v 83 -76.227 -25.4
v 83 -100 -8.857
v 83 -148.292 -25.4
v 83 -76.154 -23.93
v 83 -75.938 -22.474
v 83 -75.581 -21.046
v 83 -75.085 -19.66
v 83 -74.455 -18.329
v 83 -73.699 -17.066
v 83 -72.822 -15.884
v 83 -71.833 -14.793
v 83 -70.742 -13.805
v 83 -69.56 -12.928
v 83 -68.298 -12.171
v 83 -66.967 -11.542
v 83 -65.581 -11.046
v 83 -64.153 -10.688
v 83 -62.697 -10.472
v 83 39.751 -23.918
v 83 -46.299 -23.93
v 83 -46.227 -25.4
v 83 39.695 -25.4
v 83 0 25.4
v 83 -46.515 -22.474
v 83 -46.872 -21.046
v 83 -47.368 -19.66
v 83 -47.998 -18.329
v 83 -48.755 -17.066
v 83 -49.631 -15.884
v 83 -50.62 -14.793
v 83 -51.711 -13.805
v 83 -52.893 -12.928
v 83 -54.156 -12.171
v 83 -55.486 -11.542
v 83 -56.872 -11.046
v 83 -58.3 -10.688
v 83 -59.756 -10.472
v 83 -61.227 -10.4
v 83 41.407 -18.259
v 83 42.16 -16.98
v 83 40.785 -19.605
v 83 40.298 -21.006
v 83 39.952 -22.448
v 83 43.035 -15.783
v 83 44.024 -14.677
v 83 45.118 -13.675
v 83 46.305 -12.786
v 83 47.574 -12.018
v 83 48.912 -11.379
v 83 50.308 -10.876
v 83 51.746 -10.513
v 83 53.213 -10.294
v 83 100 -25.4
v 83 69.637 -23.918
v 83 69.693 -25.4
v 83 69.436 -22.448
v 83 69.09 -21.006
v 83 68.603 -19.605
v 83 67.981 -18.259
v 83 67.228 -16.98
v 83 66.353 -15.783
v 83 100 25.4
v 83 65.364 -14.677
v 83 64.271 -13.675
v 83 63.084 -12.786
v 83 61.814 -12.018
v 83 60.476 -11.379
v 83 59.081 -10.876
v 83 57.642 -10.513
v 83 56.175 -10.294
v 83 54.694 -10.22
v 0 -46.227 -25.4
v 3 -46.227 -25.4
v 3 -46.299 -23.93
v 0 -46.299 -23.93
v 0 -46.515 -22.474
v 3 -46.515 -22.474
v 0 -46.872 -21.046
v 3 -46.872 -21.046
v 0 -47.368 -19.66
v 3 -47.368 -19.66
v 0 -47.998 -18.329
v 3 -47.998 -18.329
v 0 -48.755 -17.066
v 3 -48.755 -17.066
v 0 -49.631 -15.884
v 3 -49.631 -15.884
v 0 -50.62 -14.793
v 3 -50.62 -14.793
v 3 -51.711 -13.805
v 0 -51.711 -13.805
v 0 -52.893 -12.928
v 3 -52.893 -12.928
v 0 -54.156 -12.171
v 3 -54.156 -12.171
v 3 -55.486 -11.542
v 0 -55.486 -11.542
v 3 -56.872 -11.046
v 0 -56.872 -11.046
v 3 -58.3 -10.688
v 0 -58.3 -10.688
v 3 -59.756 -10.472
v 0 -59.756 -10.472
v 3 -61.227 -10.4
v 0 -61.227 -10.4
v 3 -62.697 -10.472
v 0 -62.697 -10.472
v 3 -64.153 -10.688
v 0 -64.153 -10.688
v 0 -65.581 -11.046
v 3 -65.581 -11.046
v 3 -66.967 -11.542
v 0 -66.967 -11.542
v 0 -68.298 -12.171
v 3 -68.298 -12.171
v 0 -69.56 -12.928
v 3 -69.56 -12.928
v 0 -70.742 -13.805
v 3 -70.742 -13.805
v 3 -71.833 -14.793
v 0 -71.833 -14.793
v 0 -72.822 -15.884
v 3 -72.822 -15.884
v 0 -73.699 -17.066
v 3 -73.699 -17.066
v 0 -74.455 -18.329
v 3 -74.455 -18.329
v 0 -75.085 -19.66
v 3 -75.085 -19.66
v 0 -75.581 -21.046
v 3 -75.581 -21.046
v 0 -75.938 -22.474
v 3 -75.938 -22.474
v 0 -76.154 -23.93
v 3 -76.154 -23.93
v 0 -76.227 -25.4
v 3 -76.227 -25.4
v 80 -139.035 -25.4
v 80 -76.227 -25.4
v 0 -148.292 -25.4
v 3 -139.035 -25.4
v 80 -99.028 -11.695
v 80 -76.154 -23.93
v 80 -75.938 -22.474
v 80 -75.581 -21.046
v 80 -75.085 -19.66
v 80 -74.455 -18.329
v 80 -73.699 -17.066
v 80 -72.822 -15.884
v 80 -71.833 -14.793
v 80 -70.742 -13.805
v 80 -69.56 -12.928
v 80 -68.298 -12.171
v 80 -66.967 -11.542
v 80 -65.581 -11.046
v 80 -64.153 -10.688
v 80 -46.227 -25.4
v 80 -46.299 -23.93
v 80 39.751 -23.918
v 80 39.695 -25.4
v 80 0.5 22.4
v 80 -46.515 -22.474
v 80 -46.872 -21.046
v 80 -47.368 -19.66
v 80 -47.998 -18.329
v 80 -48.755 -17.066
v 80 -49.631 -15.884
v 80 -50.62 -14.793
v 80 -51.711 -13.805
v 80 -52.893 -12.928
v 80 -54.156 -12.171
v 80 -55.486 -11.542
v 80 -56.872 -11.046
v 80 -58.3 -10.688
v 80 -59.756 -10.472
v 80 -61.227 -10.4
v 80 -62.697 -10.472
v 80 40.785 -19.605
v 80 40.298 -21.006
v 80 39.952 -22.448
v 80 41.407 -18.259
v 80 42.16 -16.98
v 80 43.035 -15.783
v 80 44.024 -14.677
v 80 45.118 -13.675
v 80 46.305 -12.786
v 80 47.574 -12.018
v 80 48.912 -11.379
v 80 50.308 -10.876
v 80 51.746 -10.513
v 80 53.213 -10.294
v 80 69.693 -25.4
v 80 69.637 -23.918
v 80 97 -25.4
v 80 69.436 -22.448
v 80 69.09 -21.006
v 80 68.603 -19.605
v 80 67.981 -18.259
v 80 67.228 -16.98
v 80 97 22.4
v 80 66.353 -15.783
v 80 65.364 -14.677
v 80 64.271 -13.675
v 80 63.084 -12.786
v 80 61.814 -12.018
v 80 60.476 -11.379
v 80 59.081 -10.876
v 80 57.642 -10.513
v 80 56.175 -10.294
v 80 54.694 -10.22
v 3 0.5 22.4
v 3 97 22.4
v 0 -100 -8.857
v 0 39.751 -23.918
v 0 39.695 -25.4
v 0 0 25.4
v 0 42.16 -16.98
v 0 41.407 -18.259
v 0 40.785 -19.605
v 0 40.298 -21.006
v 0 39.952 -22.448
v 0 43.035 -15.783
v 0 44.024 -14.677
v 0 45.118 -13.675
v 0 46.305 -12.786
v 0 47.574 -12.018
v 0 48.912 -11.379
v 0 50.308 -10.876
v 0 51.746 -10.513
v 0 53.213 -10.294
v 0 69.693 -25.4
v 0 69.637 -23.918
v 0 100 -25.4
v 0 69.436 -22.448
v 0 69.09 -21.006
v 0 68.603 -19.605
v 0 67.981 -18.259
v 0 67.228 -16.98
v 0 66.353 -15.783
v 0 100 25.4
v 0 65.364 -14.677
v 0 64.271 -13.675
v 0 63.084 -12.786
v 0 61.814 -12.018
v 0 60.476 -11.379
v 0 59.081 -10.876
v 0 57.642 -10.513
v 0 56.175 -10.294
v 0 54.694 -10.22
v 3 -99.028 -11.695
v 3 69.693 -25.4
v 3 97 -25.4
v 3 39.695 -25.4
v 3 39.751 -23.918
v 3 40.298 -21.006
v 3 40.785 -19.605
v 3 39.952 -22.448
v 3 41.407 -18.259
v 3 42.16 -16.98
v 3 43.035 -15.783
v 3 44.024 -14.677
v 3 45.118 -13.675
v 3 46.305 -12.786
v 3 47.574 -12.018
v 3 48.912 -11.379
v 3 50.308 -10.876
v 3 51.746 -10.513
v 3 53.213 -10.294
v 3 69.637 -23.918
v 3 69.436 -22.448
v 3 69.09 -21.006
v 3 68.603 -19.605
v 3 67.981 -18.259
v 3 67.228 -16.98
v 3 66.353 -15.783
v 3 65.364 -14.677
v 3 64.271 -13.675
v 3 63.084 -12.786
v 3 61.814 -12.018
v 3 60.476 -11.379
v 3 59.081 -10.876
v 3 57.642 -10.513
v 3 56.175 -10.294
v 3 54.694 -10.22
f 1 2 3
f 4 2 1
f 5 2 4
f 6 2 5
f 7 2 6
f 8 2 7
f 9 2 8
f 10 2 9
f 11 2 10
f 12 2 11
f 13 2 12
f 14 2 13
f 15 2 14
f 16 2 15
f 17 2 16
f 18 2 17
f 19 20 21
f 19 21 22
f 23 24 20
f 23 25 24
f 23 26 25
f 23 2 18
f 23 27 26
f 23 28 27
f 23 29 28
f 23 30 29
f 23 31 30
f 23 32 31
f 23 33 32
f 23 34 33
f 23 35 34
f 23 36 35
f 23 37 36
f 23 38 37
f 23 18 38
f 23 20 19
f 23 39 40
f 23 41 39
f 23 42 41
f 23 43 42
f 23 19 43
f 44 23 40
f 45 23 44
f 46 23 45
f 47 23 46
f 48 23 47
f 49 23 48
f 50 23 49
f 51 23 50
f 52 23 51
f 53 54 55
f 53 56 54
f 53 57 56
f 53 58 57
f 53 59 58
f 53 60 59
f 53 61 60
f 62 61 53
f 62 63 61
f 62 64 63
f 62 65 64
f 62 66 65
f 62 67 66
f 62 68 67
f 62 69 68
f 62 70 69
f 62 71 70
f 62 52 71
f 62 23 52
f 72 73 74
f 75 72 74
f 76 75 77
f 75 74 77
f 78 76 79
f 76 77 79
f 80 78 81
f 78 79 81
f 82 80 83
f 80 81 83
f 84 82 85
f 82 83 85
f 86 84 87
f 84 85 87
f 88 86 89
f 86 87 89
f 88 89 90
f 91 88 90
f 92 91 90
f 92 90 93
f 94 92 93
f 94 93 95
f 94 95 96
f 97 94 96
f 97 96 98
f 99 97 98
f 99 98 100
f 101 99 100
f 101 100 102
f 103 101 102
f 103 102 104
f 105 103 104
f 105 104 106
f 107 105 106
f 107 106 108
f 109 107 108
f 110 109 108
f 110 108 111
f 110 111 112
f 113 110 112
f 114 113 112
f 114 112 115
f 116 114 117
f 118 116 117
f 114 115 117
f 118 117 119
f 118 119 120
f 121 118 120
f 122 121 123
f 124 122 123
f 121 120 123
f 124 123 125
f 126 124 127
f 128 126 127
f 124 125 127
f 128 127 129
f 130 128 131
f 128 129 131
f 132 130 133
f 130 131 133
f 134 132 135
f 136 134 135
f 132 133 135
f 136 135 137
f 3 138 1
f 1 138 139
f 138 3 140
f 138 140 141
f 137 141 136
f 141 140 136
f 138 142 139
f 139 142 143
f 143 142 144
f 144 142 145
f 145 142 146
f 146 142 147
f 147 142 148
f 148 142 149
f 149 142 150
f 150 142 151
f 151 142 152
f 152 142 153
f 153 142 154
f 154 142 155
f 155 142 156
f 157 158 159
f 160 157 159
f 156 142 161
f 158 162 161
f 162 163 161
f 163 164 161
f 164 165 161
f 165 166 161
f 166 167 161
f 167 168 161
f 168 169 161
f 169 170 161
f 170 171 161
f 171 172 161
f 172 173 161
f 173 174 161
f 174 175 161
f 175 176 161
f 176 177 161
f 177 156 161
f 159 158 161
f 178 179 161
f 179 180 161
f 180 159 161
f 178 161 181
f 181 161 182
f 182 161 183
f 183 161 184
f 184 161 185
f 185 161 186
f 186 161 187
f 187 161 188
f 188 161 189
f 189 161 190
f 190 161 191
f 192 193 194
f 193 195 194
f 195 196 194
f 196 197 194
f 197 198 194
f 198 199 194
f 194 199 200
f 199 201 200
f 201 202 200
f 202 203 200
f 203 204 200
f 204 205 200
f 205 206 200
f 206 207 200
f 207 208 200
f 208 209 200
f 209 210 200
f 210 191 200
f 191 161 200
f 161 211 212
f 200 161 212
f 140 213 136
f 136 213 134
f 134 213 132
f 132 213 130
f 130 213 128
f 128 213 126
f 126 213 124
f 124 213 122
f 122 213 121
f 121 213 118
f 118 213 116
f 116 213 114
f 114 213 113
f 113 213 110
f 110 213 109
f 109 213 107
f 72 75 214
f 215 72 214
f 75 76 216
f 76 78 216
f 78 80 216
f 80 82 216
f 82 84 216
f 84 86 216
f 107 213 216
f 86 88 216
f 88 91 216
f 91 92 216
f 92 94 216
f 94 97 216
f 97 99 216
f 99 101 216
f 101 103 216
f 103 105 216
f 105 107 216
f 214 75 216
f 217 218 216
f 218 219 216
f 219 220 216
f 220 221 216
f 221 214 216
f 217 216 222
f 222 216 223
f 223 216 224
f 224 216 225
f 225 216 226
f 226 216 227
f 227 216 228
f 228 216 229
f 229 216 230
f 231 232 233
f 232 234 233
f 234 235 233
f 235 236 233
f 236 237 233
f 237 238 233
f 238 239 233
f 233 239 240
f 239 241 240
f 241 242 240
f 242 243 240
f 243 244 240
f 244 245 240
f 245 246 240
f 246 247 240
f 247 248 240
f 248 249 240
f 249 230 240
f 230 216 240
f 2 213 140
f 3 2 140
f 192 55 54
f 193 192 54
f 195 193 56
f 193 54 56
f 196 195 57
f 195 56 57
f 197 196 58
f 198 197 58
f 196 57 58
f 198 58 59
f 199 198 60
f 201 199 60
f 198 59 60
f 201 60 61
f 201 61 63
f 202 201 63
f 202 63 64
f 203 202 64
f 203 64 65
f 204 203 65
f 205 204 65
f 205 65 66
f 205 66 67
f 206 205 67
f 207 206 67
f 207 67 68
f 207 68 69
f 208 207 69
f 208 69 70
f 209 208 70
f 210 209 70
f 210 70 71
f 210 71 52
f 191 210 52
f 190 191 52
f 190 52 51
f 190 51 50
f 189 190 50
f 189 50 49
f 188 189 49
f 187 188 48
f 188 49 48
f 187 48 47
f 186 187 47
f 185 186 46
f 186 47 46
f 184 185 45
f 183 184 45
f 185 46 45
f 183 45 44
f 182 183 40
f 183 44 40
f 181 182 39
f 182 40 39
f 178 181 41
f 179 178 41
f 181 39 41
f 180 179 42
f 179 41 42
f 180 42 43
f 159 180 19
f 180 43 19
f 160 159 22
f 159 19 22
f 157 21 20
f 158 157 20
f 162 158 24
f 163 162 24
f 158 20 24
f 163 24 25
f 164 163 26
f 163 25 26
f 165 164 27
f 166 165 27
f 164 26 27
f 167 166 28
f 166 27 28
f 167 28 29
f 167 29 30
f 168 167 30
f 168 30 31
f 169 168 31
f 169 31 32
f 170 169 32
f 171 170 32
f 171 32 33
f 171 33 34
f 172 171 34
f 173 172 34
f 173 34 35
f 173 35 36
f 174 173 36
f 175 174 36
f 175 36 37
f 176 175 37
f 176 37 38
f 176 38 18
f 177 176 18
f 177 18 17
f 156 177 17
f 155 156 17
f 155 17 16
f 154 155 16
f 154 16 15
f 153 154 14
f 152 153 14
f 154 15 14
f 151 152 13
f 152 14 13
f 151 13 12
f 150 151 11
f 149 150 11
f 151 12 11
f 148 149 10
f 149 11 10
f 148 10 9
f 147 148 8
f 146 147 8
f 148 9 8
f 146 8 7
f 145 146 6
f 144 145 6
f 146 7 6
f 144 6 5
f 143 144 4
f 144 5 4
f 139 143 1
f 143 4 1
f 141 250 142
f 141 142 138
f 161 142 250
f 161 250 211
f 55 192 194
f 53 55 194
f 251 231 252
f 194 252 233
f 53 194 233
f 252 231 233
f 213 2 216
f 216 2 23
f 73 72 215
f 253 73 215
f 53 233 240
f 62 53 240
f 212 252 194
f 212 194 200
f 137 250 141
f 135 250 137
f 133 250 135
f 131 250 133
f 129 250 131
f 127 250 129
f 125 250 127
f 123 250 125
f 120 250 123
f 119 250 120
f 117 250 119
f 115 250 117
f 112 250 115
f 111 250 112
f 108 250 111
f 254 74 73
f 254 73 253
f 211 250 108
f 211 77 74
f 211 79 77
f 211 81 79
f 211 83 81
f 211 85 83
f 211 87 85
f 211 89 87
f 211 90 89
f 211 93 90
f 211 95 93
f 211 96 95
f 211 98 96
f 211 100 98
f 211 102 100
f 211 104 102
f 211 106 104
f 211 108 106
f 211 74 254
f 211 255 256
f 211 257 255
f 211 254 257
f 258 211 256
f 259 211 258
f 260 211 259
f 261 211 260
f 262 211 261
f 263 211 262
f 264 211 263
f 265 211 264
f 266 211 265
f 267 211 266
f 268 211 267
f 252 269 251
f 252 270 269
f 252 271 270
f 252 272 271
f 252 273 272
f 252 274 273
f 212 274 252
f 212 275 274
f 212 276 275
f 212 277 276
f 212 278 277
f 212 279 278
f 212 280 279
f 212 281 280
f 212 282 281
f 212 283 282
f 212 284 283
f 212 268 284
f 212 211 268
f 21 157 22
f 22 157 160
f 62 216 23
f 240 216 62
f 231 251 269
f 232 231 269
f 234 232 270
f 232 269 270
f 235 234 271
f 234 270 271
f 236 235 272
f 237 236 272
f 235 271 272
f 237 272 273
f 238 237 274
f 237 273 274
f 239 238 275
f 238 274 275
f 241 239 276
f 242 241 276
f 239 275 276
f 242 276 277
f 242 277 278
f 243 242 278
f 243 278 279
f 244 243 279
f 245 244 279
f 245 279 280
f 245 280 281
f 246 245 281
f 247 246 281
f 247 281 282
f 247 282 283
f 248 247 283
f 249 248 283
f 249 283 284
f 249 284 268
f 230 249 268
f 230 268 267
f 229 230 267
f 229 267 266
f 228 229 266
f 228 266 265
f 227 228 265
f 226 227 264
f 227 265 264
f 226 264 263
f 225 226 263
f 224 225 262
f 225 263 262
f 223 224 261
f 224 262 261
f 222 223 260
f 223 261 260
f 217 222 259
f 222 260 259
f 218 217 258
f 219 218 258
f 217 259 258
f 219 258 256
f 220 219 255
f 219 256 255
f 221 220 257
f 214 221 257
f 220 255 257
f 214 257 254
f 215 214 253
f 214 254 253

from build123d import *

# Parameters (mm, degrees)
F0_W     = 200
F0_H     = 50.8
F1_DEPTH = 83
F3_DEPTH = 83
F4_DEPTH = 83
F5_T     = -3
F7_DEPTH = 101.6


with BuildPart() as f1:
    # F0 (on Right) → F1 (new body)
    with BuildSketch(Plane.YZ):
        Rectangle(F0_W, F0_H)
    extrude(amount=F1_DEPTH)

    # F2 (on face) → F3 (cut)
    with BuildSketch(Plane.YZ.offset(83)):
        Polygon((-100, -8.856749), (0, 25.4), (-100, 25.4), align=None)
    extrude(amount=-F3_DEPTH, mode=Mode.SUBTRACT)

    # F2 (on face) → F4 (join)
    with BuildSketch(Plane.YZ.offset(83)):
        Polygon((0, -25.4), (0, 25.4), (-148.291945, -25.4), align=None)
    extrude(amount=-F4_DEPTH)

    # F5
    f5_openings = [f1.faces().sort_by_distance(p)[0] for p in [
        (41.5, -24.145973, -25.4),
    ]]
    offset(amount=F5_T, openings=f5_openings)

    # F6 (on face) → F7 (cut)
    with BuildSketch(Plane.YZ.offset(83)):
        with BuildLine():
            Line((-76.226585, -25.4), (-46.226585, -25.4))
            ThreePointArc((-46.226585, -25.4), (-61.226585, -10.4), (-76.226585, -25.4))
        make_face()
        with BuildLine():
            ThreePointArc((69.692981, -25.4), (54.694057, -10.220377), (39.695133, -25.4))
            Line((39.695133, -25.4), (69.692981, -25.4))
        make_face()
    extrude(amount=-F7_DEPTH, mode=Mode.SUBTRACT)


solid = f1.part
